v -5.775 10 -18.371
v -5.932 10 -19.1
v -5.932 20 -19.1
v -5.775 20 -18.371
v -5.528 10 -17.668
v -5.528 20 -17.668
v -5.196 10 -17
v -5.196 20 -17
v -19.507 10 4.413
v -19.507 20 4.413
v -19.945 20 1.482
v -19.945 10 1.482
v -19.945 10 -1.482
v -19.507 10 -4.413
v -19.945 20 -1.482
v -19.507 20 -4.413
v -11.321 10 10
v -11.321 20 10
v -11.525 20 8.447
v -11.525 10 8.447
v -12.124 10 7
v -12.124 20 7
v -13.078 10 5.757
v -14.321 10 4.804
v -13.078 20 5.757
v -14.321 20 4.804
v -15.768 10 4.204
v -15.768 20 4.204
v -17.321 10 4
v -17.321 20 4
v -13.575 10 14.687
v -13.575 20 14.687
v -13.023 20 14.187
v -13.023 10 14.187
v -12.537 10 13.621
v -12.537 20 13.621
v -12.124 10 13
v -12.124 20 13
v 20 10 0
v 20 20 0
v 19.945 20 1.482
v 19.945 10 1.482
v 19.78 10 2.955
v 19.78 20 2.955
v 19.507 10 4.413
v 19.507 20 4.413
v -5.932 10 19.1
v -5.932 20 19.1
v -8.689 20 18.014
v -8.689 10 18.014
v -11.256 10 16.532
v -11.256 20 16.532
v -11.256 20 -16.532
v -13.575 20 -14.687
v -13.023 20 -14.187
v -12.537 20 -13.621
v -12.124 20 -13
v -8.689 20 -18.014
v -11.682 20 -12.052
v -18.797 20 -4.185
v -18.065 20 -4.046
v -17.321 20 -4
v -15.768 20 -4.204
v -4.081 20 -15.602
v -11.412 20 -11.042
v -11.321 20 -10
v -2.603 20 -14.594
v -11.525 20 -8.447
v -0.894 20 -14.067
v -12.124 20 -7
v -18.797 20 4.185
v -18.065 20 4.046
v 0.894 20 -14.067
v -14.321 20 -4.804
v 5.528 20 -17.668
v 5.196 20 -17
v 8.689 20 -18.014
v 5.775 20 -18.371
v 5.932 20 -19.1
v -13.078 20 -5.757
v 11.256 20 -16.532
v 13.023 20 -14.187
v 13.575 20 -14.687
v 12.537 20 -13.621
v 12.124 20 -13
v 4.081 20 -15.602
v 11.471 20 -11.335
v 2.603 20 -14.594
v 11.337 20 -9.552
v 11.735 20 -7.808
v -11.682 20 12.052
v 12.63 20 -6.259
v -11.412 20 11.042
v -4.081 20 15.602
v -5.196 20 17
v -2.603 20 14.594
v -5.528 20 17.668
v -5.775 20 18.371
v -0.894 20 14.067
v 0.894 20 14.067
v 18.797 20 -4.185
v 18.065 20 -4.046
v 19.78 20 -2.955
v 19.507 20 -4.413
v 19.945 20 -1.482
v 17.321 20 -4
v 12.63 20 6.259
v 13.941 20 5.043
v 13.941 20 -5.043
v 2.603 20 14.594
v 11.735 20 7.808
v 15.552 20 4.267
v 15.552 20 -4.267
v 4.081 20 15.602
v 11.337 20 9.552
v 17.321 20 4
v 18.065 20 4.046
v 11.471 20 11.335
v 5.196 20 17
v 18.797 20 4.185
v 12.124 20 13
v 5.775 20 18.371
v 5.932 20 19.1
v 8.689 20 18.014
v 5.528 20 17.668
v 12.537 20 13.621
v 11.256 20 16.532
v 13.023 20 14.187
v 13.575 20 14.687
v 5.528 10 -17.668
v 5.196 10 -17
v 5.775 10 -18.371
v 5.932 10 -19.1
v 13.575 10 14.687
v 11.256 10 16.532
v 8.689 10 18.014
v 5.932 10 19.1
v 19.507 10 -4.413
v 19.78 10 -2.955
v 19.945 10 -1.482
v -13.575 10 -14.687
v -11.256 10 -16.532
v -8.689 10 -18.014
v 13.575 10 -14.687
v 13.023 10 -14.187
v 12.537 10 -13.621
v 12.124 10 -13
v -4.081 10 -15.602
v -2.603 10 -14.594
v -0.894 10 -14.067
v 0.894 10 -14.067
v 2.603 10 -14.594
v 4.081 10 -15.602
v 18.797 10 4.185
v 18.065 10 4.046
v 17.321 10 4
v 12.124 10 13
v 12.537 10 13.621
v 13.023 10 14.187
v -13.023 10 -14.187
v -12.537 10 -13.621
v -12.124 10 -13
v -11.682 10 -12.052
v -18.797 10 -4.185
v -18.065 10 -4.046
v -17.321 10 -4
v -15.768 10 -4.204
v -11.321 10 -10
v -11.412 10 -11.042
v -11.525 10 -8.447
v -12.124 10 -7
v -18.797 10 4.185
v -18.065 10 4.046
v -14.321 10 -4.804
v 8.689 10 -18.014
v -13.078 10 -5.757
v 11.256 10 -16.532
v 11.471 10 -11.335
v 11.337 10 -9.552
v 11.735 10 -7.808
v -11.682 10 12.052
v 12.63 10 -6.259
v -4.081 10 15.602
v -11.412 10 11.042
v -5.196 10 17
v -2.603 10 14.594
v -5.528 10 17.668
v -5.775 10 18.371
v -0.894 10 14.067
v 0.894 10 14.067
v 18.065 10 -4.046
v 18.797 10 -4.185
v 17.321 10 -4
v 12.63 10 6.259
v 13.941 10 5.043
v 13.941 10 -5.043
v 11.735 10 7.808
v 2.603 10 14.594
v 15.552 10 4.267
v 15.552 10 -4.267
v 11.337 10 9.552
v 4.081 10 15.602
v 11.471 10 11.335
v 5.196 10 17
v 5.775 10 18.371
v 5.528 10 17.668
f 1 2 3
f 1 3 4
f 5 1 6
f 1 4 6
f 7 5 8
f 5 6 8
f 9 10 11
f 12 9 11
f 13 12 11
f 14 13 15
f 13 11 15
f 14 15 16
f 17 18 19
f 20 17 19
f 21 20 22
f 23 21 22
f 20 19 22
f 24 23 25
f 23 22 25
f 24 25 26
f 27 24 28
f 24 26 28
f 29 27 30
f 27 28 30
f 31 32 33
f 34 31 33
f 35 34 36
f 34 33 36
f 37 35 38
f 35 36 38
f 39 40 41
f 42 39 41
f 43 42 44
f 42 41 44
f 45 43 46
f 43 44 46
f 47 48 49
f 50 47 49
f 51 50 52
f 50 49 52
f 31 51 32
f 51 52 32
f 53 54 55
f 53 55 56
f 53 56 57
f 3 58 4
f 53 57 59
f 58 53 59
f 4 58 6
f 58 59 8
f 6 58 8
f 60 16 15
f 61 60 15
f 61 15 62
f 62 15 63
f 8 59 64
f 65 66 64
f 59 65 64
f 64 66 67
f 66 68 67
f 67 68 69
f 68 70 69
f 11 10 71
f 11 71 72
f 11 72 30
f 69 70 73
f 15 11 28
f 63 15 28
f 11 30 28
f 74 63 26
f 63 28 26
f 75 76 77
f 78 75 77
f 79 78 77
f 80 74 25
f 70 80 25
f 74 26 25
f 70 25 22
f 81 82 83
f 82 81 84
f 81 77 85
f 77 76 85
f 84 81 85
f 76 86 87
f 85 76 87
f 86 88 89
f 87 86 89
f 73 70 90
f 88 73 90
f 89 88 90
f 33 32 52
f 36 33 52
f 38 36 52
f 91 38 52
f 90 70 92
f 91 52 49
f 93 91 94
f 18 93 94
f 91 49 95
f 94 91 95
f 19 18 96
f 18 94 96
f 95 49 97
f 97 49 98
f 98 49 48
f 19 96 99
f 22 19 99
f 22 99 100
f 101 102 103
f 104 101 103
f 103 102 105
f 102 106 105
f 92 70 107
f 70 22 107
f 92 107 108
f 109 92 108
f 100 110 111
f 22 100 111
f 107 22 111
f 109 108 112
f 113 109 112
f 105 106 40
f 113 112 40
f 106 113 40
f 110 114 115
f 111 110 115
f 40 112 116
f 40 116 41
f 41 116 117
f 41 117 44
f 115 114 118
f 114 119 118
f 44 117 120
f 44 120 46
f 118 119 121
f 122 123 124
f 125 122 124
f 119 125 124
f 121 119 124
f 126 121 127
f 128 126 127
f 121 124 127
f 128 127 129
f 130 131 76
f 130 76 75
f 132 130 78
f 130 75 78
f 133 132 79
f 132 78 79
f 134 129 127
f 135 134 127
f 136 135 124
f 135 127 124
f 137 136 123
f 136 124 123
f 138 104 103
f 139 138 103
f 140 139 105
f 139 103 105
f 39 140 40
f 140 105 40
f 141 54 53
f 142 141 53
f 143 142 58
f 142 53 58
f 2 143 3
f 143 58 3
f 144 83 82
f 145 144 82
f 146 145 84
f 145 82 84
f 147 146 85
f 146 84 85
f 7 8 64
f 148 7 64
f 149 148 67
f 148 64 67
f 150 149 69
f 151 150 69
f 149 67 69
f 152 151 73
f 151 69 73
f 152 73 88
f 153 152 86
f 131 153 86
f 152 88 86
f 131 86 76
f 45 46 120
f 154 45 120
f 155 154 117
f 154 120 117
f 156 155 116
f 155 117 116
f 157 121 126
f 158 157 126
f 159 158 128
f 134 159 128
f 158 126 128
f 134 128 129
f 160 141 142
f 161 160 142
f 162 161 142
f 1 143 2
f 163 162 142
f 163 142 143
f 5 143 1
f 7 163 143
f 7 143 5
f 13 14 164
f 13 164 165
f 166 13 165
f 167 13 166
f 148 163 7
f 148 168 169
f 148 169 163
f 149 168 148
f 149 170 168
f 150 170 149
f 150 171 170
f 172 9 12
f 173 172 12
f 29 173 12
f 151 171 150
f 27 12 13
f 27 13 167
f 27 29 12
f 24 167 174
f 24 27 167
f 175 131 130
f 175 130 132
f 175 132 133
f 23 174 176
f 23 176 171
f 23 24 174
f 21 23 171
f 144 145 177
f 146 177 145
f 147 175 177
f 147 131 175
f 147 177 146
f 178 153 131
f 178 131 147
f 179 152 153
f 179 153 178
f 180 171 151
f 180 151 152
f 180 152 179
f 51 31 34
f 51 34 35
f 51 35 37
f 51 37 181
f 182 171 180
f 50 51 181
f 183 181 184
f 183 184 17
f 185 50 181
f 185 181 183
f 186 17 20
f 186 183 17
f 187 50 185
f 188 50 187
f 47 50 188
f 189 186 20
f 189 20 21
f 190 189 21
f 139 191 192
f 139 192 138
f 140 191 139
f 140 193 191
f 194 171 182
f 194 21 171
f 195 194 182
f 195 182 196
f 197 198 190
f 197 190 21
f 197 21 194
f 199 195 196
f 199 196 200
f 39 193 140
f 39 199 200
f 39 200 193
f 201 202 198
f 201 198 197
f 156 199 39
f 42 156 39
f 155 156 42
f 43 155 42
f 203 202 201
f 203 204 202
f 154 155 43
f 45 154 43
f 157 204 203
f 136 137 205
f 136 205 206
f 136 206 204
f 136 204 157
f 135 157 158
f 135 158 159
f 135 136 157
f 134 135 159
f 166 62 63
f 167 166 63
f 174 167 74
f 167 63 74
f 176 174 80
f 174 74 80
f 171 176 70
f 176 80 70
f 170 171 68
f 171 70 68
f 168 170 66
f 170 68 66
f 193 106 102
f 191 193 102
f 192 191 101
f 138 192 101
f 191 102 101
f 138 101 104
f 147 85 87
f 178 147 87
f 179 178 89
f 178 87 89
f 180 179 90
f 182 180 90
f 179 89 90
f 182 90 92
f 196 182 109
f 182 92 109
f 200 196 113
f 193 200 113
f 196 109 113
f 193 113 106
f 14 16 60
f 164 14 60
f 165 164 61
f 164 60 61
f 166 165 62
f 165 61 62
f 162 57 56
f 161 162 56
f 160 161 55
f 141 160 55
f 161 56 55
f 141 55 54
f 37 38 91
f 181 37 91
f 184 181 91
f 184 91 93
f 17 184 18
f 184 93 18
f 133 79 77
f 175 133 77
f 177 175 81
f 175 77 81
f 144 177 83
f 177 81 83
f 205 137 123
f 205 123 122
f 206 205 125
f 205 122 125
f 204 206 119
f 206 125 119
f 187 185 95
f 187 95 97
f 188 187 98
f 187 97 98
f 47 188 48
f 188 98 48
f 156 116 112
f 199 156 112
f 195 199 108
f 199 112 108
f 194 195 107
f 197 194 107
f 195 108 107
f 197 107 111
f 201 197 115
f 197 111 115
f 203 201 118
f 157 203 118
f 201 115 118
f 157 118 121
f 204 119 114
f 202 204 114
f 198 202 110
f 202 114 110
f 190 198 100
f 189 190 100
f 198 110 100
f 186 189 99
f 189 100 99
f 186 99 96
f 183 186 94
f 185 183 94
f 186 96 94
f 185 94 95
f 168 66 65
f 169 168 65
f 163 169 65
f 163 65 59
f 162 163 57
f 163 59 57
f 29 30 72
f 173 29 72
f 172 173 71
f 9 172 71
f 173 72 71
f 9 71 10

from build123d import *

# Parameters (mm, degrees)
F2_DEPTH = 10


with BuildPart() as f2:
    # F1 (on offset) → F2 (new body)
    with BuildSketch(Plane.XZ.offset(-20)):
        with BuildLine():
            ThreePointArc((12.124355653, 13), (12.7707828093, 13.9115214431), (13.5750272223, 14.6873631369))
            ThreePointArc((13.5750272223, 14.6873631369), (10, 17.3205080757), (5.93211598, 19.1))
            ThreePointArc((5.93211598, 19.1), (5.6623395704, 18.0155830606), (5.1961524227, 17))
            Line((5.1961524227, 17), (12.124355653, 13))
        make_face()
        with BuildLine():
            ThreePointArc((19.5071432023, -4.4126368631), (19.8764039007, -2.2200378324), (20, 0))
            ThreePointArc((20, 0), (19.8764039007, 2.2200378324), (19.5071432023, 4.4126368631))
            ThreePointArc((19.5071432023, 4.4126368631), (18.4331223797, 4.1040616175), (17.3205080757, 4))
            Line((17.3205080757, 4), (17.3205080757, -4))
            ThreePointArc((17.3205080757, -4), (18.4331223797, -4.1040616175), (19.5071432023, -4.4126368631))
        make_face()
        with BuildLine():
            Line((17.3205080757, -4), (17.3205080757, 4))
            ThreePointArc((17.3205080757, 4), (12.124355653, 7), (12.124355653, 13))
            Line((12.124355653, 13), (5.1961524227, 17))
            ThreePointArc((5.1961524227, 17), (0, 14), (-5.1961524227, 17))
            Line((-5.1961524227, 17), (-12.124355653, 13))
            ThreePointArc((-12.124355653, 13), (-11.524953118, 11.5529142706), (-11.3205080757, 10))
            ThreePointArc((-11.3205080757, 10), (-13.0778673886, 5.7573593129), (-17.3205080757, 4))
            Line((-17.3205080757, 4), (-17.3205080757, -4))
            ThreePointArc((-17.3205080757, -4), (-13.0778673886, -5.7573593129), (-11.3205080757, -10))
            ThreePointArc((-11.3205080757, -10), (-11.524953118, -11.5529142706), (-12.124355653, -13))
            Line((-12.124355653, -13), (-5.1961524227, -17))
            ThreePointArc((-5.1961524227, -17), (0, -14), (5.1961524227, -17))
            Line((5.1961524227, -17), (12.124355653, -13))
            ThreePointArc((12.124355653, -13), (12.124355653, -7), (17.3205080757, -4))
        make_face()
        with BuildLine():
            ThreePointArc((5.93211598, -19.1), (10, -17.3205080757), (13.5750272223, -14.6873631369))
            ThreePointArc((13.5750272223, -14.6873631369), (12.7707828093, -13.9115214431), (12.124355653, -13))
            Line((12.124355653, -13), (5.1961524227, -17))
            ThreePointArc((5.1961524227, -17), (5.6623395704, -18.0155830606), (5.93211598, -19.1))
        make_face()
        with BuildLine():
            ThreePointArc((-5.93211598, -19.1), (-5.6623395704, -18.0155830606), (-5.1961524227, -17))
            Line((-5.1961524227, -17), (-12.124355653, -13))
            ThreePointArc((-12.124355653, -13), (-12.7707828093, -13.9115214431), (-13.5750272223, -14.6873631369))
            ThreePointArc((-13.5750272223, -14.6873631369), (-10, -17.3205080757), (-5.93211598, -19.1))
        make_face()
        with BuildLine():
            Line((-12.124355653, 13), (-5.1961524227, 17))
            ThreePointArc((-5.1961524227, 17), (-5.6623395704, 18.0155830606), (-5.93211598, 19.1))
            ThreePointArc((-5.93211598, 19.1), (-10, 17.3205080757), (-13.5750272223, 14.6873631369))
            ThreePointArc((-13.5750272223, 14.6873631369), (-12.7707828093, 13.9115214431), (-12.124355653, 13))
        make_face()
        with BuildLine():
            ThreePointArc((-17.3205080757, 4), (-18.4331223797, 4.1040616175), (-19.5071432023, 4.4126368631))
            ThreePointArc((-19.5071432023, 4.4126368631), (-20, 0), (-19.5071432023, -4.4126368631))
            ThreePointArc((-19.5071432023, -4.4126368631), (-18.4331223797, -4.1040616175), (-17.3205080757, -4))
            Line((-17.3205080757, -4), (-17.3205080757, 4))
        make_face()
    extrude(amount=F2_DEPTH)


solid = f2.part
